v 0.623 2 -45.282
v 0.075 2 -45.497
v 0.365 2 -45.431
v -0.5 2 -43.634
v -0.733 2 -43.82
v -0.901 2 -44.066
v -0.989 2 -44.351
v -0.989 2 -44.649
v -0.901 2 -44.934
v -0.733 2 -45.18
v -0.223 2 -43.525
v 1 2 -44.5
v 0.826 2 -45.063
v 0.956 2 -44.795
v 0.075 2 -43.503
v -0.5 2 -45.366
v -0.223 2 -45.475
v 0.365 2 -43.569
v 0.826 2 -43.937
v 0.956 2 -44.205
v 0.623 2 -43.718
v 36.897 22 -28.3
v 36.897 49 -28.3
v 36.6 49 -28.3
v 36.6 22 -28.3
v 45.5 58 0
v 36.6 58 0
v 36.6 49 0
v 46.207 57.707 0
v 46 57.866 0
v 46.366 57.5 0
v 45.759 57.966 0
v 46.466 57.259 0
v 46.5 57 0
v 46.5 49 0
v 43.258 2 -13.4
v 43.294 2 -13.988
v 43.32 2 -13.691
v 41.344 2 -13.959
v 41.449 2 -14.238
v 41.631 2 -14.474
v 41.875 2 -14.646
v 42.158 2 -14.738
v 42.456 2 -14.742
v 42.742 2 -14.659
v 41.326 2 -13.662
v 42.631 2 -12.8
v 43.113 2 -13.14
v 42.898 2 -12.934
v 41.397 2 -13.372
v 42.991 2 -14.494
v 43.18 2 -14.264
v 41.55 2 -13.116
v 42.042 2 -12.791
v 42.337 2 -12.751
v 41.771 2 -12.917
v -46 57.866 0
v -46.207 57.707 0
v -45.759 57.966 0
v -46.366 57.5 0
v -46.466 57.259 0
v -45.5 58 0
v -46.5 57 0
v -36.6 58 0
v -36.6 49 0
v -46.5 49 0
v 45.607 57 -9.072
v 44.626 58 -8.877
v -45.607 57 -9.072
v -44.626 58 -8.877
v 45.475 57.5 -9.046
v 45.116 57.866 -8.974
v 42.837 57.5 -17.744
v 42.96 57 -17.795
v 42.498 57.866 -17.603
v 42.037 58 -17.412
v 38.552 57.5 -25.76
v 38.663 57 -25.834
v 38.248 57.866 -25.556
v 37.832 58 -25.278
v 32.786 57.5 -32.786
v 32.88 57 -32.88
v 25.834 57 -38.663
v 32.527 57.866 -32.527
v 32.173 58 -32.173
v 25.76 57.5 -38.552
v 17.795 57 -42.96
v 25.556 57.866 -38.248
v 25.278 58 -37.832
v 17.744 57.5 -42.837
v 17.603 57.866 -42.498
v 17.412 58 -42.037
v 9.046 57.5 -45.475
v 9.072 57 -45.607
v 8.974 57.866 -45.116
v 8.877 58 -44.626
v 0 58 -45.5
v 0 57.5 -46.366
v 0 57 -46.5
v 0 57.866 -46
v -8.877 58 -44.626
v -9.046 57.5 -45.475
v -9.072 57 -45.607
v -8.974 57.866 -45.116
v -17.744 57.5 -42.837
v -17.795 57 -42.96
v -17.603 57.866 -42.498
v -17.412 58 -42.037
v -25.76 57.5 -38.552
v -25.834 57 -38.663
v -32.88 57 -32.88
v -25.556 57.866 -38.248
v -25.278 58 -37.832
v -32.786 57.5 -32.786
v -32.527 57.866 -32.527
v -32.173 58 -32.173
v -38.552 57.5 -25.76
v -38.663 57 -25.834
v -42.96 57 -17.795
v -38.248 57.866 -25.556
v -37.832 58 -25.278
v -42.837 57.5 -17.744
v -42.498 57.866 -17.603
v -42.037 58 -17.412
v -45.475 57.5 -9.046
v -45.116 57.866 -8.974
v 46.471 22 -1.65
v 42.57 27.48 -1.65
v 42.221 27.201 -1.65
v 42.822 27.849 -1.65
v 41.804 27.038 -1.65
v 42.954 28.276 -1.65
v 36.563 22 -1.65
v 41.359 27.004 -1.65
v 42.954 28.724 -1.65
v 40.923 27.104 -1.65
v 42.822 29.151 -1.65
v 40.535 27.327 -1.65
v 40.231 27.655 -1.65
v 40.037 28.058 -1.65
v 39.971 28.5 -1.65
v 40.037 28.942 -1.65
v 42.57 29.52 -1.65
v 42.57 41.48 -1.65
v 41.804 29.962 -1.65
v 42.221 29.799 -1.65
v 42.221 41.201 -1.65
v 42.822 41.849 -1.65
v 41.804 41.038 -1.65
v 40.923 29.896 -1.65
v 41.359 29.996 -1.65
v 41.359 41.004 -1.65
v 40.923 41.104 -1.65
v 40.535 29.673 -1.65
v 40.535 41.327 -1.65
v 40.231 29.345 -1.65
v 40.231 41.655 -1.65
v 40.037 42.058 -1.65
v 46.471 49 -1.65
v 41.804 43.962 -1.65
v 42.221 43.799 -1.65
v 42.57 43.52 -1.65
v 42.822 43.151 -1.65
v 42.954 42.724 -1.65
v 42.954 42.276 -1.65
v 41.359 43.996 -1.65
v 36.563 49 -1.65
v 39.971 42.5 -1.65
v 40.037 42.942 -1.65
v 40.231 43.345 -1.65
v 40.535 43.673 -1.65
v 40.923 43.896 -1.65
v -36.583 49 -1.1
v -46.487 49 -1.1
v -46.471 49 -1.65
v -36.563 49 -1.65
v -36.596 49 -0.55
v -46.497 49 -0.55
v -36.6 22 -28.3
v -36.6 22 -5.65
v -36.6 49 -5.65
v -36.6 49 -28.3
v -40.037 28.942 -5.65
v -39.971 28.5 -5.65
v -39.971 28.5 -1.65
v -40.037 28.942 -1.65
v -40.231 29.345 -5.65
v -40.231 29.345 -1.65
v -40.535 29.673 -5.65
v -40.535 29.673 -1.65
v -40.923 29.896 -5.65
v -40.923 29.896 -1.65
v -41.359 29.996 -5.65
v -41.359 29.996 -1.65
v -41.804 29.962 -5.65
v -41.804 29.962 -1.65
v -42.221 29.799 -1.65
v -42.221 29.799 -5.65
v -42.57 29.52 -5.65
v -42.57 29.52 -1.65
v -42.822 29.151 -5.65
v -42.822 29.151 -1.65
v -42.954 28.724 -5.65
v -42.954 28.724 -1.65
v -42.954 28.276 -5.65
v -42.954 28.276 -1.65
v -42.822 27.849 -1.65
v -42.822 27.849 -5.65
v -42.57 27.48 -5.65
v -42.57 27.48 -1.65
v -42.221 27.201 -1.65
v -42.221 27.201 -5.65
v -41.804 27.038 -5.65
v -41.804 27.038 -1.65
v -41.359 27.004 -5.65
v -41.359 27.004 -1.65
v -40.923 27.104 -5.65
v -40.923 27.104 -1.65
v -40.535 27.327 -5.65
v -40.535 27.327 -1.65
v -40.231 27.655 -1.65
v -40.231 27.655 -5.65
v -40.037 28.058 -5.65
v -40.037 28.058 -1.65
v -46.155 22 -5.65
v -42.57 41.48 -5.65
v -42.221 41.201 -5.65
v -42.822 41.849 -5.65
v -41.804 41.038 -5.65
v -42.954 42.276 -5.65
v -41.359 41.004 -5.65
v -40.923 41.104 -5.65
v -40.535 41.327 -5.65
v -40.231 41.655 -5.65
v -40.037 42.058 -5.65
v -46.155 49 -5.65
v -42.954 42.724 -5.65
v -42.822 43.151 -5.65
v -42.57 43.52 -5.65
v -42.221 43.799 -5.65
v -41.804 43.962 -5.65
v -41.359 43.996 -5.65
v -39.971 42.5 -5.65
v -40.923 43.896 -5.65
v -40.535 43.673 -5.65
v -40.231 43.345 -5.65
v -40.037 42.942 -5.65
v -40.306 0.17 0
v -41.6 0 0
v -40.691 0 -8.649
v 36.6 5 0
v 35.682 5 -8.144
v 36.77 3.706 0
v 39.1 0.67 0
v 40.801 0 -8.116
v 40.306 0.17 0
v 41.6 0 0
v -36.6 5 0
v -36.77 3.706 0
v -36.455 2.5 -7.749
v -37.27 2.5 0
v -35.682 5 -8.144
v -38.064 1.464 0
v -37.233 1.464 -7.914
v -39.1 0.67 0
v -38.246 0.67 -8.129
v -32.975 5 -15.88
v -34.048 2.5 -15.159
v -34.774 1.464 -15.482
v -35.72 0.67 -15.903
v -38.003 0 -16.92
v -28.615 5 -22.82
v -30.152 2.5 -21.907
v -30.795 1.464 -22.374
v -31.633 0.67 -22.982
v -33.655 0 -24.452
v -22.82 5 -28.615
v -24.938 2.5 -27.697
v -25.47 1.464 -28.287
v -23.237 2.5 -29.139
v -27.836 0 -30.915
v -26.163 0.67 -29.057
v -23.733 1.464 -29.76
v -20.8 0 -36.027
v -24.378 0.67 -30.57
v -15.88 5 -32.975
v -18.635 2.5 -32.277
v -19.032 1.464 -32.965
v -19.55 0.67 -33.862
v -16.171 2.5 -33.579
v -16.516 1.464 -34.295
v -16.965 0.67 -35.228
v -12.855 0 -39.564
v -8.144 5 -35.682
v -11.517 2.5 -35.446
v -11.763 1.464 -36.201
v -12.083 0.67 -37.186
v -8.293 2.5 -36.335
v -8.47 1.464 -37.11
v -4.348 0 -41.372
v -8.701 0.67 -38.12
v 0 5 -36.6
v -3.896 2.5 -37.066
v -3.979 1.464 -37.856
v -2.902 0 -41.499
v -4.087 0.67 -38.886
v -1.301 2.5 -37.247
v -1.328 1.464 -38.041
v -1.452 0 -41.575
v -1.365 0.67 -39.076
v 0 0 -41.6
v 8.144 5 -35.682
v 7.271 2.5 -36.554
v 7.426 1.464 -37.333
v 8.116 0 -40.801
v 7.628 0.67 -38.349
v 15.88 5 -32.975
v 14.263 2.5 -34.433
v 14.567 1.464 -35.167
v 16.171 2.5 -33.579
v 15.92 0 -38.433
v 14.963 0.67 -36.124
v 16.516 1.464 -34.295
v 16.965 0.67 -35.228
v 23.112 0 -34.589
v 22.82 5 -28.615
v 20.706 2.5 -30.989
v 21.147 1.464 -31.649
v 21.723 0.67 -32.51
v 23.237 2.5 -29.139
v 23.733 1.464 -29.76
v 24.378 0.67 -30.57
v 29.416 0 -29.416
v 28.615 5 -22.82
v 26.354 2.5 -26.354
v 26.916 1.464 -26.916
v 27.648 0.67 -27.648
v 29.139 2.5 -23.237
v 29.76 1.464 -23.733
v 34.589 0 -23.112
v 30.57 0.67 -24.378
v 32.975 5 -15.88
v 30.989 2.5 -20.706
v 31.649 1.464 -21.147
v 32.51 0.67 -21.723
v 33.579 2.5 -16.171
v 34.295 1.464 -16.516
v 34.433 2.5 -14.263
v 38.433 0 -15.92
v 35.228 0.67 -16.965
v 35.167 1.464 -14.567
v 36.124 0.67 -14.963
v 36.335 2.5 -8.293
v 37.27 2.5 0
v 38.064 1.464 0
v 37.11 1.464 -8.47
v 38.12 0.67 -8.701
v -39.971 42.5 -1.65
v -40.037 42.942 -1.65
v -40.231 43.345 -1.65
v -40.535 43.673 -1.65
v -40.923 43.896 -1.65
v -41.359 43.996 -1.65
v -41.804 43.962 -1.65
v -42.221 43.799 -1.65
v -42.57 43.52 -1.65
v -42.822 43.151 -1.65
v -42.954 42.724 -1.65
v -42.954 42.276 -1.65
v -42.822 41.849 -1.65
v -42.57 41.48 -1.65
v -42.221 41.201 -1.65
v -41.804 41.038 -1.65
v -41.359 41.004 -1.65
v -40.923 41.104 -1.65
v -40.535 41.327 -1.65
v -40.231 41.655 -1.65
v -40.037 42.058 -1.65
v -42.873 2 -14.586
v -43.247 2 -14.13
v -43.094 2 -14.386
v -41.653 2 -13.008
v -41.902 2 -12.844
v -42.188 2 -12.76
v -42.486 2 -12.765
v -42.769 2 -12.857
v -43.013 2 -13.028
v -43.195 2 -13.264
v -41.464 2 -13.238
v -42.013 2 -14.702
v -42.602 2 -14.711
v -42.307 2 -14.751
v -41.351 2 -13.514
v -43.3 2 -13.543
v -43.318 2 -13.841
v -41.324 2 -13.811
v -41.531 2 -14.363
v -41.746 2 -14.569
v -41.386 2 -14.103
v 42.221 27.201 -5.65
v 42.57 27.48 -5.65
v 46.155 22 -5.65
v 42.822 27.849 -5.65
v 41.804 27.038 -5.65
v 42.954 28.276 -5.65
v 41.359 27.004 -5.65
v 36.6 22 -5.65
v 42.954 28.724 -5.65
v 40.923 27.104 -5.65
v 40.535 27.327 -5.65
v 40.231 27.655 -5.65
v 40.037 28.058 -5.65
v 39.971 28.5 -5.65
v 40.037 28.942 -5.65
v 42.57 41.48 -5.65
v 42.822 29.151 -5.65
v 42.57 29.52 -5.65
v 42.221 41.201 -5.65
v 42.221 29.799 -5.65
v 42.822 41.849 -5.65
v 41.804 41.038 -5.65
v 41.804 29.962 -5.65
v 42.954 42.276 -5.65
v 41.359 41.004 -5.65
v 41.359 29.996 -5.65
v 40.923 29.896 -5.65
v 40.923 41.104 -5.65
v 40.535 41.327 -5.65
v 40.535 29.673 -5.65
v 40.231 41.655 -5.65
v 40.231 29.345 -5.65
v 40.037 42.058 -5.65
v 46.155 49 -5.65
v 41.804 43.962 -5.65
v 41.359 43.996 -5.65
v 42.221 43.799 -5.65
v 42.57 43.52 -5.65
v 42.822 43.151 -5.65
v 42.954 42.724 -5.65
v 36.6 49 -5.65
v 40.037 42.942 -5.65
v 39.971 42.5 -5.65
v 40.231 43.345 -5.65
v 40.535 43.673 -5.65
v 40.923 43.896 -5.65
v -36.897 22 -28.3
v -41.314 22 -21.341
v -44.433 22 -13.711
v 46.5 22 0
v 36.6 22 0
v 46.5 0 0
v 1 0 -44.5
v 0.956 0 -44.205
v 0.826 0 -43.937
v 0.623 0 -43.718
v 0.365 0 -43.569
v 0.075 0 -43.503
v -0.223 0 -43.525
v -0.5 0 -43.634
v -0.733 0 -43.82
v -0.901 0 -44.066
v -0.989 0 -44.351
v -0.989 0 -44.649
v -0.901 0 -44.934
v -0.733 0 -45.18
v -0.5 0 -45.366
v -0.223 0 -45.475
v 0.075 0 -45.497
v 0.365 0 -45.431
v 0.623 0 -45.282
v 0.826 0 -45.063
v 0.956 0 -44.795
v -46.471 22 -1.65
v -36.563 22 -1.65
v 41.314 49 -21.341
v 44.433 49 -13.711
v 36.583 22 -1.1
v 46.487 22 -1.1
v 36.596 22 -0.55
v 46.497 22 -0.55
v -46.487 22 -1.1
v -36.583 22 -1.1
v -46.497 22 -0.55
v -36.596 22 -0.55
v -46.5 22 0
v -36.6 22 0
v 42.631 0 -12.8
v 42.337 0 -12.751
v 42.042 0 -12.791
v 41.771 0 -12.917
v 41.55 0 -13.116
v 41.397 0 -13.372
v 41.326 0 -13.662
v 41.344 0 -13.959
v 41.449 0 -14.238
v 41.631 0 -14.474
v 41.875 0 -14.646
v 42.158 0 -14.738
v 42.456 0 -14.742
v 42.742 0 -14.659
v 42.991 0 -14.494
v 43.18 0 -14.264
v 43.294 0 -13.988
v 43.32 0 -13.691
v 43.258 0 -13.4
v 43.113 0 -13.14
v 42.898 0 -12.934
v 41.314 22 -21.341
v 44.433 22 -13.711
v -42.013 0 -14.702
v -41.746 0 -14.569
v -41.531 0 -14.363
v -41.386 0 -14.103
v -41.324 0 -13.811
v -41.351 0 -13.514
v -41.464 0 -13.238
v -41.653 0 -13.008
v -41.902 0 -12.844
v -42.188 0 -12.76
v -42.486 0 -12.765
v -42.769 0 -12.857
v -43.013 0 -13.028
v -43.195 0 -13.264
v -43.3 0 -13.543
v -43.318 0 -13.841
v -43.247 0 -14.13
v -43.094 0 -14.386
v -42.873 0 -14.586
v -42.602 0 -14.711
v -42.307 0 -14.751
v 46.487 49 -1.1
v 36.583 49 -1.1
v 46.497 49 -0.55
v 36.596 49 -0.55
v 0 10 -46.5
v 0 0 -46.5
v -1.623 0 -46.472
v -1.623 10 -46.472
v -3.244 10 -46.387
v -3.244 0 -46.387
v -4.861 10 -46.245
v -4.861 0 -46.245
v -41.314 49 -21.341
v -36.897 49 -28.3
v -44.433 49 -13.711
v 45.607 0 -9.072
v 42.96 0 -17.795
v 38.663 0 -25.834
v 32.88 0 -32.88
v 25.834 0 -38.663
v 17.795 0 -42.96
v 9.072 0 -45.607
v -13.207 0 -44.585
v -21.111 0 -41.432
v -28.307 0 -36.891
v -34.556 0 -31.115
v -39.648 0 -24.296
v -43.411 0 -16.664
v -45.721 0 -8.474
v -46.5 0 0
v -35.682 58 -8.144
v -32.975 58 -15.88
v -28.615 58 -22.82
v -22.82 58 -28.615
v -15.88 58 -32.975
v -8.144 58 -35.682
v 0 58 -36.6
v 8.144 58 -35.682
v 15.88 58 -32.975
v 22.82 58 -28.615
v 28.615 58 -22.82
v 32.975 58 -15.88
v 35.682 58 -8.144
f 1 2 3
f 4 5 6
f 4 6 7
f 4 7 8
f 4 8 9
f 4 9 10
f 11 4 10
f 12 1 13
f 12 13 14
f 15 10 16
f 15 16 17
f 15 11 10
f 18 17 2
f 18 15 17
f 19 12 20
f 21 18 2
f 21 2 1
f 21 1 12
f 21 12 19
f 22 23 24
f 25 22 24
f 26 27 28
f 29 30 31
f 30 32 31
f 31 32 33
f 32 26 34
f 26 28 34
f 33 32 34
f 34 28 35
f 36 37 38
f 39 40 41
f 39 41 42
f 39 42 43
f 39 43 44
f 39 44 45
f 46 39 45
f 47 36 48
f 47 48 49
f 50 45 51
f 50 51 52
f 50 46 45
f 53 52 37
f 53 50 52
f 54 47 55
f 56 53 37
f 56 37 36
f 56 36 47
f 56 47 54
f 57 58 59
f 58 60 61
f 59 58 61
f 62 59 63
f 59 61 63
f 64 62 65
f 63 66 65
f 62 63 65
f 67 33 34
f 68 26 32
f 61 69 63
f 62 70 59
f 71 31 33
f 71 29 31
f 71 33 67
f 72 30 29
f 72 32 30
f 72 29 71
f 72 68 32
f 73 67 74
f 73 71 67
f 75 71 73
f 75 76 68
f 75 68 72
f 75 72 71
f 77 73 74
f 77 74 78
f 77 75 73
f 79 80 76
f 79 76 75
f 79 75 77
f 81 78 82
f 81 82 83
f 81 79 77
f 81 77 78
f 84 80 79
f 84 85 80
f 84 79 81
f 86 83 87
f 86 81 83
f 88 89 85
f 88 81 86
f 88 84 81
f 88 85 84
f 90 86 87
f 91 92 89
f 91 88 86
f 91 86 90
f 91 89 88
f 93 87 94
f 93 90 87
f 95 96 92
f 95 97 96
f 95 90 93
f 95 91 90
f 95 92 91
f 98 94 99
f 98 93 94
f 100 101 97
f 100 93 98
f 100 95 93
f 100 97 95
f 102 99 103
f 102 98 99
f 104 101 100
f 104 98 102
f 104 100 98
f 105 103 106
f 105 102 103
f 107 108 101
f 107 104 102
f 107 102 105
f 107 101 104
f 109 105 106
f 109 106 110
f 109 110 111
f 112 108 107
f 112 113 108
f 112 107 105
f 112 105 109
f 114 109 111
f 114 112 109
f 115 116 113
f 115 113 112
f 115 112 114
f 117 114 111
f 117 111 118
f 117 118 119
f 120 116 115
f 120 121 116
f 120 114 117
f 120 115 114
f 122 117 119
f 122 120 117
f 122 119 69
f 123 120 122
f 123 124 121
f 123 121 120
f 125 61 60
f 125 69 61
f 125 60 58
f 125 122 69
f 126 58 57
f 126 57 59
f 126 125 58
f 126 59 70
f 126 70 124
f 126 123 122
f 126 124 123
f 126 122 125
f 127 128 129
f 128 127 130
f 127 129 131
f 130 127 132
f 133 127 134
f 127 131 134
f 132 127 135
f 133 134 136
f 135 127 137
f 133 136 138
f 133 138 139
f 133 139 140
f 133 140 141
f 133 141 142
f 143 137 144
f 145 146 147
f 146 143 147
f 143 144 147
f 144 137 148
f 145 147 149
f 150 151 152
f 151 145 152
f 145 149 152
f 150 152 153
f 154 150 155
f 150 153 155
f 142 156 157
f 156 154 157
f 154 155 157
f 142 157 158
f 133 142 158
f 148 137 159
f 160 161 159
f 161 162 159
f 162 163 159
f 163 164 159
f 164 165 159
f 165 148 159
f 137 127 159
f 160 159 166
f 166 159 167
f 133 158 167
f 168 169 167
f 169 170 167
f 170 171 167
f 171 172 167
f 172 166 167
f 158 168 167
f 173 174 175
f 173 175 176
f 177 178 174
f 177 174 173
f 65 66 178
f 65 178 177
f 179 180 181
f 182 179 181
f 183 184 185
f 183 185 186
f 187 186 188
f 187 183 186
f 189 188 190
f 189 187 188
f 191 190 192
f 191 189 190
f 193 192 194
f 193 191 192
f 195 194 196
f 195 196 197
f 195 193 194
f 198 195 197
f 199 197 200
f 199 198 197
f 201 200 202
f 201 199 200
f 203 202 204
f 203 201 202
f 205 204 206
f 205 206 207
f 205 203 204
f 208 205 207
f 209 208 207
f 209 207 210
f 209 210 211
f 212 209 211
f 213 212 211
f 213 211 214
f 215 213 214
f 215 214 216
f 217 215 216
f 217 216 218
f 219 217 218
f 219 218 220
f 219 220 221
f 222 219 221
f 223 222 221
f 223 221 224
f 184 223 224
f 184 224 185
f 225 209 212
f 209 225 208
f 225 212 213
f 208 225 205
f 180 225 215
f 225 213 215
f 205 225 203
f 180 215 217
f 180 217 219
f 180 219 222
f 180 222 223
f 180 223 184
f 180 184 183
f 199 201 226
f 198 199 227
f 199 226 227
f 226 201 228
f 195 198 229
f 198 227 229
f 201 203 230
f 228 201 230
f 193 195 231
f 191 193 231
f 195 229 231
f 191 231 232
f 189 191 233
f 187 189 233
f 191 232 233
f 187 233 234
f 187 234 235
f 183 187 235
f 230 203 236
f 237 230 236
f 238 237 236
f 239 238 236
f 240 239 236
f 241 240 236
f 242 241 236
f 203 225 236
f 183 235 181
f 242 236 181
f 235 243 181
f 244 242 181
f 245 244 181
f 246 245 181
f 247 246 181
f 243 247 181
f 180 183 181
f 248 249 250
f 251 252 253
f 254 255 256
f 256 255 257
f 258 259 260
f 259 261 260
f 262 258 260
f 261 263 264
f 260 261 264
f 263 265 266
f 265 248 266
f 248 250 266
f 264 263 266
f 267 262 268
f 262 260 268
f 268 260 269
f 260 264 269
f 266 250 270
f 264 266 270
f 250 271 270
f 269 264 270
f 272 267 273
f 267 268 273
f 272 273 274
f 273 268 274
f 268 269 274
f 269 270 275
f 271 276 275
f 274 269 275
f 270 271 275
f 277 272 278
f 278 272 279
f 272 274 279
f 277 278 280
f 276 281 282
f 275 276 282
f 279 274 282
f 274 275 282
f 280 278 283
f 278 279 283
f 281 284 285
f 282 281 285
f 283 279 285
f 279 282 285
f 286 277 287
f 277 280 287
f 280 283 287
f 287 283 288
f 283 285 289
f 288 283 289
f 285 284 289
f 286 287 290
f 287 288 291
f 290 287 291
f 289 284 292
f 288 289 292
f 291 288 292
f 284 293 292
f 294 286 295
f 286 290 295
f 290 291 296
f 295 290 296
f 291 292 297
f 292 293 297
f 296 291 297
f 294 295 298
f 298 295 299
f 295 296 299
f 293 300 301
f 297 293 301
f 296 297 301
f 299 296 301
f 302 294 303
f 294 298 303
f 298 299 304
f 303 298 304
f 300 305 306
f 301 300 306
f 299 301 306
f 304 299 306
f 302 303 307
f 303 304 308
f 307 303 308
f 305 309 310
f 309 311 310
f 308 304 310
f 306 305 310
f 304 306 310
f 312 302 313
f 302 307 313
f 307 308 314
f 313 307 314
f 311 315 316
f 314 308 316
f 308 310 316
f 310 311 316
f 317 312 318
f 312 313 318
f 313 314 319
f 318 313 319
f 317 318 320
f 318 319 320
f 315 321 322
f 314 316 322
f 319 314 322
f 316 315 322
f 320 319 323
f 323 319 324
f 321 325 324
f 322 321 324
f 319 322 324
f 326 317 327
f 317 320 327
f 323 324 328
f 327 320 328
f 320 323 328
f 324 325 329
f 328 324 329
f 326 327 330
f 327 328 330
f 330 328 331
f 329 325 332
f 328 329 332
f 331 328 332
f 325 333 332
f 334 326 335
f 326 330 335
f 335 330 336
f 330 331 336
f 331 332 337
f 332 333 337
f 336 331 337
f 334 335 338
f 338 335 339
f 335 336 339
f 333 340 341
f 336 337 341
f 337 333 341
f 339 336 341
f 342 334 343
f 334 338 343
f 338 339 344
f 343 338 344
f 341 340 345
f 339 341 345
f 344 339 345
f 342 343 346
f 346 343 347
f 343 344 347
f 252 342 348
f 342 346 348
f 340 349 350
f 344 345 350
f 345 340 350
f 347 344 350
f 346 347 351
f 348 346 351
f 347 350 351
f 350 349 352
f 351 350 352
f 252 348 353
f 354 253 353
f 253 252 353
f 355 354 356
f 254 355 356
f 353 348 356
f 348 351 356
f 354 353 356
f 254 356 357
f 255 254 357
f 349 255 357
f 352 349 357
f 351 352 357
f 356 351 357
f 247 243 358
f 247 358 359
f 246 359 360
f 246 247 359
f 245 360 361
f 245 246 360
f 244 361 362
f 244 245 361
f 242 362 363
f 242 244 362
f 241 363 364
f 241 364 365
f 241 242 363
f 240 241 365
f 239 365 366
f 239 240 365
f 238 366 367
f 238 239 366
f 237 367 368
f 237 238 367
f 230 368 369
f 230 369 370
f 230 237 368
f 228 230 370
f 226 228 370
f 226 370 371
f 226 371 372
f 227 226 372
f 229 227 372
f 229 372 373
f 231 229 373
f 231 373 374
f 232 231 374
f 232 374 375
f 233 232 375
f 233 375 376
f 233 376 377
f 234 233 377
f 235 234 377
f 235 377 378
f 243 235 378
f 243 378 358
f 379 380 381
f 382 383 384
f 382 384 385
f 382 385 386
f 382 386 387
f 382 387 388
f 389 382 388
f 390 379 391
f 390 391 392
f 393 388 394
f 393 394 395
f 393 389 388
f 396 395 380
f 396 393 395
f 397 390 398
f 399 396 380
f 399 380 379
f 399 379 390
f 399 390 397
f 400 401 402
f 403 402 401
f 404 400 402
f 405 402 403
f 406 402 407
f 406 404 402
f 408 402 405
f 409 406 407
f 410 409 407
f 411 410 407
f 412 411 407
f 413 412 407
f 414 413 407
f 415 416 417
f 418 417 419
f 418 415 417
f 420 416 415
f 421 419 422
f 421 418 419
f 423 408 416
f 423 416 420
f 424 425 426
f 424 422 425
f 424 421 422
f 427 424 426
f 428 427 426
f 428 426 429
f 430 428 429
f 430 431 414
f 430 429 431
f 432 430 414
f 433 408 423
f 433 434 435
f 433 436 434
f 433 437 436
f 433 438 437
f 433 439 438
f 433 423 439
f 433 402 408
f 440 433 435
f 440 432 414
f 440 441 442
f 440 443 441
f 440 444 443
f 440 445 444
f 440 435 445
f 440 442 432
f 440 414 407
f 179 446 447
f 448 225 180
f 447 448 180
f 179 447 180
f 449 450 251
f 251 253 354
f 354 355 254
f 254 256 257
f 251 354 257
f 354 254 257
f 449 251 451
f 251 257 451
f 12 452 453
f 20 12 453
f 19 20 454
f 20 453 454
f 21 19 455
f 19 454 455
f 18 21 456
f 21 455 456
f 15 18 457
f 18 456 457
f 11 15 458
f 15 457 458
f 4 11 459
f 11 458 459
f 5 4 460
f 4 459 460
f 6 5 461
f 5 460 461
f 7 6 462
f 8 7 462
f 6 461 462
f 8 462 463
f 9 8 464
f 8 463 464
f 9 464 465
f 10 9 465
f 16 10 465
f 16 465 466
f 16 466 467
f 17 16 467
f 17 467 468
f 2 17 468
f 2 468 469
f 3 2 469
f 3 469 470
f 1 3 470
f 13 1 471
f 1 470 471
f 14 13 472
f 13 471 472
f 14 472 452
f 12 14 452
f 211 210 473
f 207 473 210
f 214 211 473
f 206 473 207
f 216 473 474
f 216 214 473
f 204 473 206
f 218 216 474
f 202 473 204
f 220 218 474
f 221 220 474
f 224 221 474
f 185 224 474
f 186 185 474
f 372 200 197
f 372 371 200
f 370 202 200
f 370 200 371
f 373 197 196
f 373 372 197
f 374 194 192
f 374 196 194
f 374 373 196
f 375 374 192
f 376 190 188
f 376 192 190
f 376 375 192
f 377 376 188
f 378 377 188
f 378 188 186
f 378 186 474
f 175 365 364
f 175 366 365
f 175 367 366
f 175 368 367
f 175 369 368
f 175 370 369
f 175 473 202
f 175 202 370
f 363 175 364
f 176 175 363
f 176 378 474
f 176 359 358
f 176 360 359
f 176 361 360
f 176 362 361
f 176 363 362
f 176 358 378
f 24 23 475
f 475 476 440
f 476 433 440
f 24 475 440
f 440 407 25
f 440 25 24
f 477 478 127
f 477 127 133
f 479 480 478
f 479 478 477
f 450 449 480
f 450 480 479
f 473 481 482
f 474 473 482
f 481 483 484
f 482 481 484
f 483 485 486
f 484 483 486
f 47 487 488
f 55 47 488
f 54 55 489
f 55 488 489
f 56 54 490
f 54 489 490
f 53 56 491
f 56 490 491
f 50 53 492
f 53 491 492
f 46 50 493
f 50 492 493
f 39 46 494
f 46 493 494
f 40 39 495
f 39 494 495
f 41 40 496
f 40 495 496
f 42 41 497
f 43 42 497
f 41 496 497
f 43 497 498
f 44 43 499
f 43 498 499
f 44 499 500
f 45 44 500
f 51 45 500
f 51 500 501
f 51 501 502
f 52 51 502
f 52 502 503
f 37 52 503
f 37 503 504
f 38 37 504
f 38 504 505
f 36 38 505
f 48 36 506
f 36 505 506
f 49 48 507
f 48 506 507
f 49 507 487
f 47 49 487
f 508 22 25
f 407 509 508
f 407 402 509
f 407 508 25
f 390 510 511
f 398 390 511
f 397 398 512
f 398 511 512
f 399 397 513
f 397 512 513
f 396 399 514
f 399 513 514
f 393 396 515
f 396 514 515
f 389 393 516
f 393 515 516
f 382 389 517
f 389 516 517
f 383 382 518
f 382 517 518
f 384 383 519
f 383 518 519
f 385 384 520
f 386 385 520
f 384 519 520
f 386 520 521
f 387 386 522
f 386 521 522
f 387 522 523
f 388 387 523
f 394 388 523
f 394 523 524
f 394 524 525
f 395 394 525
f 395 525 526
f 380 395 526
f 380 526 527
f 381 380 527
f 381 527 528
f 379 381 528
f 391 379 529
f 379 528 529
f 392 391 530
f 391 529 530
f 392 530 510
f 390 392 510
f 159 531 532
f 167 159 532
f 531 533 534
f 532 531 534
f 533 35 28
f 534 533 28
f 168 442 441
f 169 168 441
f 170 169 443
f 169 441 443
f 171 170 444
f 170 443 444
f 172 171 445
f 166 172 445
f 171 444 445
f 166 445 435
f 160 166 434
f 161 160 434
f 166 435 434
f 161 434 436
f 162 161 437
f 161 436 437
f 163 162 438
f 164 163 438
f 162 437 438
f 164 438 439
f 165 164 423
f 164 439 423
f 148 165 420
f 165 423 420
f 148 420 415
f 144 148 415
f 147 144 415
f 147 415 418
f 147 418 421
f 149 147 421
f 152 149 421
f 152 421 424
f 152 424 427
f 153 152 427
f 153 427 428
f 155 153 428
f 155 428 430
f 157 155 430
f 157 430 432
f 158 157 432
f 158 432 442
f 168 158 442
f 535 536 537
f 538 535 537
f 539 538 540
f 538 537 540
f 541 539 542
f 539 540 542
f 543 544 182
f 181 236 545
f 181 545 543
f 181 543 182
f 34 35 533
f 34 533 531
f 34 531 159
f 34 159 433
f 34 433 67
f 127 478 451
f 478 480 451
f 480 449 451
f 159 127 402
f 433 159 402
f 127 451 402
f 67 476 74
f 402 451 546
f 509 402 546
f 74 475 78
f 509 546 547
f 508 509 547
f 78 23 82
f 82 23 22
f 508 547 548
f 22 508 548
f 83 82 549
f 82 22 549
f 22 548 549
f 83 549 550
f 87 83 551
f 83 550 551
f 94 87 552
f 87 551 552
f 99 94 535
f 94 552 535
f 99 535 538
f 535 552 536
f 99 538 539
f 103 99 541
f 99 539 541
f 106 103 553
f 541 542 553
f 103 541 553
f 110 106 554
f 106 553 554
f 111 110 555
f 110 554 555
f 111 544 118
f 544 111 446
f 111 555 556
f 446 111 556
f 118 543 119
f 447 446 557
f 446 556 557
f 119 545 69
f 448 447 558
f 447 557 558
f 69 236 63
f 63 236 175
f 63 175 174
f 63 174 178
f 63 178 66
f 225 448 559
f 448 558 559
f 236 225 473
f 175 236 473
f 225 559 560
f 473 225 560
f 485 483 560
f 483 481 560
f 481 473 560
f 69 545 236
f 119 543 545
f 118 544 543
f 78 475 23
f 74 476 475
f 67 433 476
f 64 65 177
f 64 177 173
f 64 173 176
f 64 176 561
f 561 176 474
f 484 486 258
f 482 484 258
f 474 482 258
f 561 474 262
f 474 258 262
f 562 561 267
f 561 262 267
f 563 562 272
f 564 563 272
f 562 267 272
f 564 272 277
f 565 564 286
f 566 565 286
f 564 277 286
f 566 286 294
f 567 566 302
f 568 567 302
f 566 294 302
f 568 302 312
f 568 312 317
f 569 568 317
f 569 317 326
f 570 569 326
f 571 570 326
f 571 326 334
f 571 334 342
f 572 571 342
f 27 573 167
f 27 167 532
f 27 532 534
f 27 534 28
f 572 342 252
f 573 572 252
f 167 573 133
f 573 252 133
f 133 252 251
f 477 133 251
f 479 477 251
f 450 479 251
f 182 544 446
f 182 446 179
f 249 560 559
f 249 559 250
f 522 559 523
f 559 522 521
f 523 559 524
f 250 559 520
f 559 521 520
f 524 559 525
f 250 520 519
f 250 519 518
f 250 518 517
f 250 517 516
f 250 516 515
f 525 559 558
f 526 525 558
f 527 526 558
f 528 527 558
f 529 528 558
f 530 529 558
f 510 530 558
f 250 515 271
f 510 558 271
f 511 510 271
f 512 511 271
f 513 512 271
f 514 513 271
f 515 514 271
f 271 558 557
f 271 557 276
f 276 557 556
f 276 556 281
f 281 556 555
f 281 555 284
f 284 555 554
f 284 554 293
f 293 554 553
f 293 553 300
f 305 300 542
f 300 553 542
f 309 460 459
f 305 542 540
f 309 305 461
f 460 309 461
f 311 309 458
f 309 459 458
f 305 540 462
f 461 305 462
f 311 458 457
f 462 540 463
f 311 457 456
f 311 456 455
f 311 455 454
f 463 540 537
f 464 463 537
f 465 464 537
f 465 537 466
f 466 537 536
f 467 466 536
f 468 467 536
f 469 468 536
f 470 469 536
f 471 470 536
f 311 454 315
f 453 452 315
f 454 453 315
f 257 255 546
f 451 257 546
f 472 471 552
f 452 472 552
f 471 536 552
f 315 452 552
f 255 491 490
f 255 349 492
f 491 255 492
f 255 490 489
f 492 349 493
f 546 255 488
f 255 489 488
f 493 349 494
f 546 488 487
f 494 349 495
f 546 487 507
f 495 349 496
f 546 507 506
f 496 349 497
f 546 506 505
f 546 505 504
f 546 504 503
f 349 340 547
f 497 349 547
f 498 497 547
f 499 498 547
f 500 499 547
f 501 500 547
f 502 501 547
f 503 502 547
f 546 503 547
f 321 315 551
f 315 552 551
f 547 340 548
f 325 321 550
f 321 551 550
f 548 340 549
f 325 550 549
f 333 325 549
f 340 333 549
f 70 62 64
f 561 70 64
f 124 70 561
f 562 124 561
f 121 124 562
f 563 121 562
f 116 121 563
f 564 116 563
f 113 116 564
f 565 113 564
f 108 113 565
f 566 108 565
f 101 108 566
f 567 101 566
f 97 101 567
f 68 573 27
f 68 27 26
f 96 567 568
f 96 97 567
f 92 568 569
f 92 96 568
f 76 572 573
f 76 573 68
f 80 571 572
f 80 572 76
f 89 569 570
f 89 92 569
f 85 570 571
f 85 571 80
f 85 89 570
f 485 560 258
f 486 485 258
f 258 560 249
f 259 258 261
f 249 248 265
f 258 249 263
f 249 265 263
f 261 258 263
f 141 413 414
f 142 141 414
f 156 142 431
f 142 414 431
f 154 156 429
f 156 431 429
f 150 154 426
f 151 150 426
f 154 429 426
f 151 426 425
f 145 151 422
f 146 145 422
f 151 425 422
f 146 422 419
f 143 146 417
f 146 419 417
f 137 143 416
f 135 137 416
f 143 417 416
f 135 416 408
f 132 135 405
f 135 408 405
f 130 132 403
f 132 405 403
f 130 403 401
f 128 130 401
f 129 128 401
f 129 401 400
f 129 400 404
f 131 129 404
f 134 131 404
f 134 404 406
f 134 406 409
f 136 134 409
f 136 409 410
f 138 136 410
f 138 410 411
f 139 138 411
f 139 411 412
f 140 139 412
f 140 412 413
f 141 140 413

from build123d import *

# Parameters (mm, degrees)
EXTRUDE_1_DEPTH          = 58
FILLET_1_R               = 5
SKETCH_2_W               = 14.1984483
SKETCH_2_H               = 27
CUT_EXTRUDE_1_DEPTH      = 1.65
CUT_EXTRUDE_START        = -22.111141
SKETCH_3_R               = 1.5
CUT_EXTRUDE_2_DEPTH      = 22.111141
SKETCH_5_W               = 9.9
SKETCH_5_H               = 27
CUT_EXTRUDE_3_DEPTH      = 22.65
FILLET_2_R               = 1
EXTRUDE_2_DEPTH          = 10
SKETCH_9_R               = 1
CUT_EXTRUDE_4_DEPTH      = 2
PATTERN_CIRCULAR_1_COUNT = 5


with BuildPart() as part:
    # 草图1 → 凸台-拉伸1 (new body)
    with BuildSketch(Plane(origin=(0, 0, 0), x_dir=(1, 0, 0), z_dir=(0, 1, 0))):
        with BuildLine():
            Line((-46.5, 0), (-36.6, 0))
            ThreePointArc((-36.6, 0), (0, 36.6), (36.6, 0))
            Line((36.6, 0), (46.5, 0))
            ThreePointArc((46.5, 0), (0, 46.5), (-46.5, 0))
        make_face()
    extrude(amount=EXTRUDE_1_DEPTH)

    # 圆角1
    fillet_1_edges = [part.edges().sort_by_distance(p)[0] for p in [
        (0, 0, -36.6),
    ]]
    fillet(fillet_1_edges, radius=FILLET_1_R)

    # 草图2 → 切除-拉伸1 (cut)
    with BuildSketch(Plane.XY):
        with Locations((-41.149885232, 35.5)):
            Rectangle(SKETCH_2_W, SKETCH_2_H)
    cut_extrude_1 = extrude(amount=-CUT_EXTRUDE_1_DEPTH, mode=Mode.SUBTRACT)

    # 草图3 → 切除-拉伸2 (cut)
    with BuildSketch(Plane.XY.offset(-1.65).offset(CUT_EXTRUDE_START)):
        with Locations((-41.470716586, 28.5)):
            Circle(SKETCH_3_R)
        with Locations((-41.470716586, 42.5)):
            Circle(SKETCH_3_R)
    cut_extrude_2 = extrude(amount=CUT_EXTRUDE_2_DEPTH, mode=Mode.SUBTRACT)

    # 草图5 → 切除-拉伸3 (cut)
    with BuildSketch(Plane.XY.offset(-5.65)):
        with Locations((-41.55, 35.5)):
            Rectangle(SKETCH_5_W, SKETCH_5_H)
    cut_extrude_3 = extrude(amount=-CUT_EXTRUDE_3_DEPTH, mode=Mode.SUBTRACT)

    # 镜向2: 切除-拉伸1, 切除-拉伸2, 切除-拉伸3 across plane
    add(cut_extrude_1.mirror(Plane(origin=(0, 0, 0), x_dir=(0, 0, 1), z_dir=(1, 0, 0))), mode=Mode.SUBTRACT)
    add(cut_extrude_2.mirror(Plane(origin=(0, 0, 0), x_dir=(0, 0, 1), z_dir=(1, 0, 0))), mode=Mode.SUBTRACT)
    add(cut_extrude_3.mirror(Plane(origin=(0, 0, 0), x_dir=(0, 0, 1), z_dir=(1, 0, 0))), mode=Mode.SUBTRACT)

    # 圆角2
    fillet_2_edges = [part.edges().sort_by_distance(p)[0] for p in [
        (0, 58, -46.5),
    ]]
    fillet(fillet_2_edges, radius=FILLET_2_R)

    # 草图8 → 凸台-拉伸2 (add)
    with BuildSketch(Plane.XZ):
        with BuildLine():
            Line((0, -41.6), (0, -46.5))
            ThreePointArc((0, -46.5), (-2.433621965, -46.436273366), (-4.860573542, -46.245268135))
            Line((-4.860573542, -46.245268135), (-4.348384072, -41.372110847))
            ThreePointArc((-4.348384072, -41.372110847), (-2.17717578, -41.542988646), (0, -41.6))
        make_face()
    extrude(amount=-EXTRUDE_2_DEPTH)

    # 草图9 → 切除-拉伸4 (cut)
    with BuildSketch(Plane.XZ):
        with Locations((0, -44.5)):
            Circle(SKETCH_9_R)
    cut_extrude_4 = extrude(amount=-CUT_EXTRUDE_4_DEPTH, mode=Mode.SUBTRACT)

    # 阵列(圆周)1: 切除-拉伸4 ×5 about axis
    pattern_circular_1_axis = Axis((0, 0, 0), (0, 1, 0))
    for i in range(1, PATTERN_CIRCULAR_1_COUNT):
        add(cut_extrude_4.rotate(pattern_circular_1_axis, i * 360 / PATTERN_CIRCULAR_1_COUNT), mode=Mode.SUBTRACT)


solid = part.part
